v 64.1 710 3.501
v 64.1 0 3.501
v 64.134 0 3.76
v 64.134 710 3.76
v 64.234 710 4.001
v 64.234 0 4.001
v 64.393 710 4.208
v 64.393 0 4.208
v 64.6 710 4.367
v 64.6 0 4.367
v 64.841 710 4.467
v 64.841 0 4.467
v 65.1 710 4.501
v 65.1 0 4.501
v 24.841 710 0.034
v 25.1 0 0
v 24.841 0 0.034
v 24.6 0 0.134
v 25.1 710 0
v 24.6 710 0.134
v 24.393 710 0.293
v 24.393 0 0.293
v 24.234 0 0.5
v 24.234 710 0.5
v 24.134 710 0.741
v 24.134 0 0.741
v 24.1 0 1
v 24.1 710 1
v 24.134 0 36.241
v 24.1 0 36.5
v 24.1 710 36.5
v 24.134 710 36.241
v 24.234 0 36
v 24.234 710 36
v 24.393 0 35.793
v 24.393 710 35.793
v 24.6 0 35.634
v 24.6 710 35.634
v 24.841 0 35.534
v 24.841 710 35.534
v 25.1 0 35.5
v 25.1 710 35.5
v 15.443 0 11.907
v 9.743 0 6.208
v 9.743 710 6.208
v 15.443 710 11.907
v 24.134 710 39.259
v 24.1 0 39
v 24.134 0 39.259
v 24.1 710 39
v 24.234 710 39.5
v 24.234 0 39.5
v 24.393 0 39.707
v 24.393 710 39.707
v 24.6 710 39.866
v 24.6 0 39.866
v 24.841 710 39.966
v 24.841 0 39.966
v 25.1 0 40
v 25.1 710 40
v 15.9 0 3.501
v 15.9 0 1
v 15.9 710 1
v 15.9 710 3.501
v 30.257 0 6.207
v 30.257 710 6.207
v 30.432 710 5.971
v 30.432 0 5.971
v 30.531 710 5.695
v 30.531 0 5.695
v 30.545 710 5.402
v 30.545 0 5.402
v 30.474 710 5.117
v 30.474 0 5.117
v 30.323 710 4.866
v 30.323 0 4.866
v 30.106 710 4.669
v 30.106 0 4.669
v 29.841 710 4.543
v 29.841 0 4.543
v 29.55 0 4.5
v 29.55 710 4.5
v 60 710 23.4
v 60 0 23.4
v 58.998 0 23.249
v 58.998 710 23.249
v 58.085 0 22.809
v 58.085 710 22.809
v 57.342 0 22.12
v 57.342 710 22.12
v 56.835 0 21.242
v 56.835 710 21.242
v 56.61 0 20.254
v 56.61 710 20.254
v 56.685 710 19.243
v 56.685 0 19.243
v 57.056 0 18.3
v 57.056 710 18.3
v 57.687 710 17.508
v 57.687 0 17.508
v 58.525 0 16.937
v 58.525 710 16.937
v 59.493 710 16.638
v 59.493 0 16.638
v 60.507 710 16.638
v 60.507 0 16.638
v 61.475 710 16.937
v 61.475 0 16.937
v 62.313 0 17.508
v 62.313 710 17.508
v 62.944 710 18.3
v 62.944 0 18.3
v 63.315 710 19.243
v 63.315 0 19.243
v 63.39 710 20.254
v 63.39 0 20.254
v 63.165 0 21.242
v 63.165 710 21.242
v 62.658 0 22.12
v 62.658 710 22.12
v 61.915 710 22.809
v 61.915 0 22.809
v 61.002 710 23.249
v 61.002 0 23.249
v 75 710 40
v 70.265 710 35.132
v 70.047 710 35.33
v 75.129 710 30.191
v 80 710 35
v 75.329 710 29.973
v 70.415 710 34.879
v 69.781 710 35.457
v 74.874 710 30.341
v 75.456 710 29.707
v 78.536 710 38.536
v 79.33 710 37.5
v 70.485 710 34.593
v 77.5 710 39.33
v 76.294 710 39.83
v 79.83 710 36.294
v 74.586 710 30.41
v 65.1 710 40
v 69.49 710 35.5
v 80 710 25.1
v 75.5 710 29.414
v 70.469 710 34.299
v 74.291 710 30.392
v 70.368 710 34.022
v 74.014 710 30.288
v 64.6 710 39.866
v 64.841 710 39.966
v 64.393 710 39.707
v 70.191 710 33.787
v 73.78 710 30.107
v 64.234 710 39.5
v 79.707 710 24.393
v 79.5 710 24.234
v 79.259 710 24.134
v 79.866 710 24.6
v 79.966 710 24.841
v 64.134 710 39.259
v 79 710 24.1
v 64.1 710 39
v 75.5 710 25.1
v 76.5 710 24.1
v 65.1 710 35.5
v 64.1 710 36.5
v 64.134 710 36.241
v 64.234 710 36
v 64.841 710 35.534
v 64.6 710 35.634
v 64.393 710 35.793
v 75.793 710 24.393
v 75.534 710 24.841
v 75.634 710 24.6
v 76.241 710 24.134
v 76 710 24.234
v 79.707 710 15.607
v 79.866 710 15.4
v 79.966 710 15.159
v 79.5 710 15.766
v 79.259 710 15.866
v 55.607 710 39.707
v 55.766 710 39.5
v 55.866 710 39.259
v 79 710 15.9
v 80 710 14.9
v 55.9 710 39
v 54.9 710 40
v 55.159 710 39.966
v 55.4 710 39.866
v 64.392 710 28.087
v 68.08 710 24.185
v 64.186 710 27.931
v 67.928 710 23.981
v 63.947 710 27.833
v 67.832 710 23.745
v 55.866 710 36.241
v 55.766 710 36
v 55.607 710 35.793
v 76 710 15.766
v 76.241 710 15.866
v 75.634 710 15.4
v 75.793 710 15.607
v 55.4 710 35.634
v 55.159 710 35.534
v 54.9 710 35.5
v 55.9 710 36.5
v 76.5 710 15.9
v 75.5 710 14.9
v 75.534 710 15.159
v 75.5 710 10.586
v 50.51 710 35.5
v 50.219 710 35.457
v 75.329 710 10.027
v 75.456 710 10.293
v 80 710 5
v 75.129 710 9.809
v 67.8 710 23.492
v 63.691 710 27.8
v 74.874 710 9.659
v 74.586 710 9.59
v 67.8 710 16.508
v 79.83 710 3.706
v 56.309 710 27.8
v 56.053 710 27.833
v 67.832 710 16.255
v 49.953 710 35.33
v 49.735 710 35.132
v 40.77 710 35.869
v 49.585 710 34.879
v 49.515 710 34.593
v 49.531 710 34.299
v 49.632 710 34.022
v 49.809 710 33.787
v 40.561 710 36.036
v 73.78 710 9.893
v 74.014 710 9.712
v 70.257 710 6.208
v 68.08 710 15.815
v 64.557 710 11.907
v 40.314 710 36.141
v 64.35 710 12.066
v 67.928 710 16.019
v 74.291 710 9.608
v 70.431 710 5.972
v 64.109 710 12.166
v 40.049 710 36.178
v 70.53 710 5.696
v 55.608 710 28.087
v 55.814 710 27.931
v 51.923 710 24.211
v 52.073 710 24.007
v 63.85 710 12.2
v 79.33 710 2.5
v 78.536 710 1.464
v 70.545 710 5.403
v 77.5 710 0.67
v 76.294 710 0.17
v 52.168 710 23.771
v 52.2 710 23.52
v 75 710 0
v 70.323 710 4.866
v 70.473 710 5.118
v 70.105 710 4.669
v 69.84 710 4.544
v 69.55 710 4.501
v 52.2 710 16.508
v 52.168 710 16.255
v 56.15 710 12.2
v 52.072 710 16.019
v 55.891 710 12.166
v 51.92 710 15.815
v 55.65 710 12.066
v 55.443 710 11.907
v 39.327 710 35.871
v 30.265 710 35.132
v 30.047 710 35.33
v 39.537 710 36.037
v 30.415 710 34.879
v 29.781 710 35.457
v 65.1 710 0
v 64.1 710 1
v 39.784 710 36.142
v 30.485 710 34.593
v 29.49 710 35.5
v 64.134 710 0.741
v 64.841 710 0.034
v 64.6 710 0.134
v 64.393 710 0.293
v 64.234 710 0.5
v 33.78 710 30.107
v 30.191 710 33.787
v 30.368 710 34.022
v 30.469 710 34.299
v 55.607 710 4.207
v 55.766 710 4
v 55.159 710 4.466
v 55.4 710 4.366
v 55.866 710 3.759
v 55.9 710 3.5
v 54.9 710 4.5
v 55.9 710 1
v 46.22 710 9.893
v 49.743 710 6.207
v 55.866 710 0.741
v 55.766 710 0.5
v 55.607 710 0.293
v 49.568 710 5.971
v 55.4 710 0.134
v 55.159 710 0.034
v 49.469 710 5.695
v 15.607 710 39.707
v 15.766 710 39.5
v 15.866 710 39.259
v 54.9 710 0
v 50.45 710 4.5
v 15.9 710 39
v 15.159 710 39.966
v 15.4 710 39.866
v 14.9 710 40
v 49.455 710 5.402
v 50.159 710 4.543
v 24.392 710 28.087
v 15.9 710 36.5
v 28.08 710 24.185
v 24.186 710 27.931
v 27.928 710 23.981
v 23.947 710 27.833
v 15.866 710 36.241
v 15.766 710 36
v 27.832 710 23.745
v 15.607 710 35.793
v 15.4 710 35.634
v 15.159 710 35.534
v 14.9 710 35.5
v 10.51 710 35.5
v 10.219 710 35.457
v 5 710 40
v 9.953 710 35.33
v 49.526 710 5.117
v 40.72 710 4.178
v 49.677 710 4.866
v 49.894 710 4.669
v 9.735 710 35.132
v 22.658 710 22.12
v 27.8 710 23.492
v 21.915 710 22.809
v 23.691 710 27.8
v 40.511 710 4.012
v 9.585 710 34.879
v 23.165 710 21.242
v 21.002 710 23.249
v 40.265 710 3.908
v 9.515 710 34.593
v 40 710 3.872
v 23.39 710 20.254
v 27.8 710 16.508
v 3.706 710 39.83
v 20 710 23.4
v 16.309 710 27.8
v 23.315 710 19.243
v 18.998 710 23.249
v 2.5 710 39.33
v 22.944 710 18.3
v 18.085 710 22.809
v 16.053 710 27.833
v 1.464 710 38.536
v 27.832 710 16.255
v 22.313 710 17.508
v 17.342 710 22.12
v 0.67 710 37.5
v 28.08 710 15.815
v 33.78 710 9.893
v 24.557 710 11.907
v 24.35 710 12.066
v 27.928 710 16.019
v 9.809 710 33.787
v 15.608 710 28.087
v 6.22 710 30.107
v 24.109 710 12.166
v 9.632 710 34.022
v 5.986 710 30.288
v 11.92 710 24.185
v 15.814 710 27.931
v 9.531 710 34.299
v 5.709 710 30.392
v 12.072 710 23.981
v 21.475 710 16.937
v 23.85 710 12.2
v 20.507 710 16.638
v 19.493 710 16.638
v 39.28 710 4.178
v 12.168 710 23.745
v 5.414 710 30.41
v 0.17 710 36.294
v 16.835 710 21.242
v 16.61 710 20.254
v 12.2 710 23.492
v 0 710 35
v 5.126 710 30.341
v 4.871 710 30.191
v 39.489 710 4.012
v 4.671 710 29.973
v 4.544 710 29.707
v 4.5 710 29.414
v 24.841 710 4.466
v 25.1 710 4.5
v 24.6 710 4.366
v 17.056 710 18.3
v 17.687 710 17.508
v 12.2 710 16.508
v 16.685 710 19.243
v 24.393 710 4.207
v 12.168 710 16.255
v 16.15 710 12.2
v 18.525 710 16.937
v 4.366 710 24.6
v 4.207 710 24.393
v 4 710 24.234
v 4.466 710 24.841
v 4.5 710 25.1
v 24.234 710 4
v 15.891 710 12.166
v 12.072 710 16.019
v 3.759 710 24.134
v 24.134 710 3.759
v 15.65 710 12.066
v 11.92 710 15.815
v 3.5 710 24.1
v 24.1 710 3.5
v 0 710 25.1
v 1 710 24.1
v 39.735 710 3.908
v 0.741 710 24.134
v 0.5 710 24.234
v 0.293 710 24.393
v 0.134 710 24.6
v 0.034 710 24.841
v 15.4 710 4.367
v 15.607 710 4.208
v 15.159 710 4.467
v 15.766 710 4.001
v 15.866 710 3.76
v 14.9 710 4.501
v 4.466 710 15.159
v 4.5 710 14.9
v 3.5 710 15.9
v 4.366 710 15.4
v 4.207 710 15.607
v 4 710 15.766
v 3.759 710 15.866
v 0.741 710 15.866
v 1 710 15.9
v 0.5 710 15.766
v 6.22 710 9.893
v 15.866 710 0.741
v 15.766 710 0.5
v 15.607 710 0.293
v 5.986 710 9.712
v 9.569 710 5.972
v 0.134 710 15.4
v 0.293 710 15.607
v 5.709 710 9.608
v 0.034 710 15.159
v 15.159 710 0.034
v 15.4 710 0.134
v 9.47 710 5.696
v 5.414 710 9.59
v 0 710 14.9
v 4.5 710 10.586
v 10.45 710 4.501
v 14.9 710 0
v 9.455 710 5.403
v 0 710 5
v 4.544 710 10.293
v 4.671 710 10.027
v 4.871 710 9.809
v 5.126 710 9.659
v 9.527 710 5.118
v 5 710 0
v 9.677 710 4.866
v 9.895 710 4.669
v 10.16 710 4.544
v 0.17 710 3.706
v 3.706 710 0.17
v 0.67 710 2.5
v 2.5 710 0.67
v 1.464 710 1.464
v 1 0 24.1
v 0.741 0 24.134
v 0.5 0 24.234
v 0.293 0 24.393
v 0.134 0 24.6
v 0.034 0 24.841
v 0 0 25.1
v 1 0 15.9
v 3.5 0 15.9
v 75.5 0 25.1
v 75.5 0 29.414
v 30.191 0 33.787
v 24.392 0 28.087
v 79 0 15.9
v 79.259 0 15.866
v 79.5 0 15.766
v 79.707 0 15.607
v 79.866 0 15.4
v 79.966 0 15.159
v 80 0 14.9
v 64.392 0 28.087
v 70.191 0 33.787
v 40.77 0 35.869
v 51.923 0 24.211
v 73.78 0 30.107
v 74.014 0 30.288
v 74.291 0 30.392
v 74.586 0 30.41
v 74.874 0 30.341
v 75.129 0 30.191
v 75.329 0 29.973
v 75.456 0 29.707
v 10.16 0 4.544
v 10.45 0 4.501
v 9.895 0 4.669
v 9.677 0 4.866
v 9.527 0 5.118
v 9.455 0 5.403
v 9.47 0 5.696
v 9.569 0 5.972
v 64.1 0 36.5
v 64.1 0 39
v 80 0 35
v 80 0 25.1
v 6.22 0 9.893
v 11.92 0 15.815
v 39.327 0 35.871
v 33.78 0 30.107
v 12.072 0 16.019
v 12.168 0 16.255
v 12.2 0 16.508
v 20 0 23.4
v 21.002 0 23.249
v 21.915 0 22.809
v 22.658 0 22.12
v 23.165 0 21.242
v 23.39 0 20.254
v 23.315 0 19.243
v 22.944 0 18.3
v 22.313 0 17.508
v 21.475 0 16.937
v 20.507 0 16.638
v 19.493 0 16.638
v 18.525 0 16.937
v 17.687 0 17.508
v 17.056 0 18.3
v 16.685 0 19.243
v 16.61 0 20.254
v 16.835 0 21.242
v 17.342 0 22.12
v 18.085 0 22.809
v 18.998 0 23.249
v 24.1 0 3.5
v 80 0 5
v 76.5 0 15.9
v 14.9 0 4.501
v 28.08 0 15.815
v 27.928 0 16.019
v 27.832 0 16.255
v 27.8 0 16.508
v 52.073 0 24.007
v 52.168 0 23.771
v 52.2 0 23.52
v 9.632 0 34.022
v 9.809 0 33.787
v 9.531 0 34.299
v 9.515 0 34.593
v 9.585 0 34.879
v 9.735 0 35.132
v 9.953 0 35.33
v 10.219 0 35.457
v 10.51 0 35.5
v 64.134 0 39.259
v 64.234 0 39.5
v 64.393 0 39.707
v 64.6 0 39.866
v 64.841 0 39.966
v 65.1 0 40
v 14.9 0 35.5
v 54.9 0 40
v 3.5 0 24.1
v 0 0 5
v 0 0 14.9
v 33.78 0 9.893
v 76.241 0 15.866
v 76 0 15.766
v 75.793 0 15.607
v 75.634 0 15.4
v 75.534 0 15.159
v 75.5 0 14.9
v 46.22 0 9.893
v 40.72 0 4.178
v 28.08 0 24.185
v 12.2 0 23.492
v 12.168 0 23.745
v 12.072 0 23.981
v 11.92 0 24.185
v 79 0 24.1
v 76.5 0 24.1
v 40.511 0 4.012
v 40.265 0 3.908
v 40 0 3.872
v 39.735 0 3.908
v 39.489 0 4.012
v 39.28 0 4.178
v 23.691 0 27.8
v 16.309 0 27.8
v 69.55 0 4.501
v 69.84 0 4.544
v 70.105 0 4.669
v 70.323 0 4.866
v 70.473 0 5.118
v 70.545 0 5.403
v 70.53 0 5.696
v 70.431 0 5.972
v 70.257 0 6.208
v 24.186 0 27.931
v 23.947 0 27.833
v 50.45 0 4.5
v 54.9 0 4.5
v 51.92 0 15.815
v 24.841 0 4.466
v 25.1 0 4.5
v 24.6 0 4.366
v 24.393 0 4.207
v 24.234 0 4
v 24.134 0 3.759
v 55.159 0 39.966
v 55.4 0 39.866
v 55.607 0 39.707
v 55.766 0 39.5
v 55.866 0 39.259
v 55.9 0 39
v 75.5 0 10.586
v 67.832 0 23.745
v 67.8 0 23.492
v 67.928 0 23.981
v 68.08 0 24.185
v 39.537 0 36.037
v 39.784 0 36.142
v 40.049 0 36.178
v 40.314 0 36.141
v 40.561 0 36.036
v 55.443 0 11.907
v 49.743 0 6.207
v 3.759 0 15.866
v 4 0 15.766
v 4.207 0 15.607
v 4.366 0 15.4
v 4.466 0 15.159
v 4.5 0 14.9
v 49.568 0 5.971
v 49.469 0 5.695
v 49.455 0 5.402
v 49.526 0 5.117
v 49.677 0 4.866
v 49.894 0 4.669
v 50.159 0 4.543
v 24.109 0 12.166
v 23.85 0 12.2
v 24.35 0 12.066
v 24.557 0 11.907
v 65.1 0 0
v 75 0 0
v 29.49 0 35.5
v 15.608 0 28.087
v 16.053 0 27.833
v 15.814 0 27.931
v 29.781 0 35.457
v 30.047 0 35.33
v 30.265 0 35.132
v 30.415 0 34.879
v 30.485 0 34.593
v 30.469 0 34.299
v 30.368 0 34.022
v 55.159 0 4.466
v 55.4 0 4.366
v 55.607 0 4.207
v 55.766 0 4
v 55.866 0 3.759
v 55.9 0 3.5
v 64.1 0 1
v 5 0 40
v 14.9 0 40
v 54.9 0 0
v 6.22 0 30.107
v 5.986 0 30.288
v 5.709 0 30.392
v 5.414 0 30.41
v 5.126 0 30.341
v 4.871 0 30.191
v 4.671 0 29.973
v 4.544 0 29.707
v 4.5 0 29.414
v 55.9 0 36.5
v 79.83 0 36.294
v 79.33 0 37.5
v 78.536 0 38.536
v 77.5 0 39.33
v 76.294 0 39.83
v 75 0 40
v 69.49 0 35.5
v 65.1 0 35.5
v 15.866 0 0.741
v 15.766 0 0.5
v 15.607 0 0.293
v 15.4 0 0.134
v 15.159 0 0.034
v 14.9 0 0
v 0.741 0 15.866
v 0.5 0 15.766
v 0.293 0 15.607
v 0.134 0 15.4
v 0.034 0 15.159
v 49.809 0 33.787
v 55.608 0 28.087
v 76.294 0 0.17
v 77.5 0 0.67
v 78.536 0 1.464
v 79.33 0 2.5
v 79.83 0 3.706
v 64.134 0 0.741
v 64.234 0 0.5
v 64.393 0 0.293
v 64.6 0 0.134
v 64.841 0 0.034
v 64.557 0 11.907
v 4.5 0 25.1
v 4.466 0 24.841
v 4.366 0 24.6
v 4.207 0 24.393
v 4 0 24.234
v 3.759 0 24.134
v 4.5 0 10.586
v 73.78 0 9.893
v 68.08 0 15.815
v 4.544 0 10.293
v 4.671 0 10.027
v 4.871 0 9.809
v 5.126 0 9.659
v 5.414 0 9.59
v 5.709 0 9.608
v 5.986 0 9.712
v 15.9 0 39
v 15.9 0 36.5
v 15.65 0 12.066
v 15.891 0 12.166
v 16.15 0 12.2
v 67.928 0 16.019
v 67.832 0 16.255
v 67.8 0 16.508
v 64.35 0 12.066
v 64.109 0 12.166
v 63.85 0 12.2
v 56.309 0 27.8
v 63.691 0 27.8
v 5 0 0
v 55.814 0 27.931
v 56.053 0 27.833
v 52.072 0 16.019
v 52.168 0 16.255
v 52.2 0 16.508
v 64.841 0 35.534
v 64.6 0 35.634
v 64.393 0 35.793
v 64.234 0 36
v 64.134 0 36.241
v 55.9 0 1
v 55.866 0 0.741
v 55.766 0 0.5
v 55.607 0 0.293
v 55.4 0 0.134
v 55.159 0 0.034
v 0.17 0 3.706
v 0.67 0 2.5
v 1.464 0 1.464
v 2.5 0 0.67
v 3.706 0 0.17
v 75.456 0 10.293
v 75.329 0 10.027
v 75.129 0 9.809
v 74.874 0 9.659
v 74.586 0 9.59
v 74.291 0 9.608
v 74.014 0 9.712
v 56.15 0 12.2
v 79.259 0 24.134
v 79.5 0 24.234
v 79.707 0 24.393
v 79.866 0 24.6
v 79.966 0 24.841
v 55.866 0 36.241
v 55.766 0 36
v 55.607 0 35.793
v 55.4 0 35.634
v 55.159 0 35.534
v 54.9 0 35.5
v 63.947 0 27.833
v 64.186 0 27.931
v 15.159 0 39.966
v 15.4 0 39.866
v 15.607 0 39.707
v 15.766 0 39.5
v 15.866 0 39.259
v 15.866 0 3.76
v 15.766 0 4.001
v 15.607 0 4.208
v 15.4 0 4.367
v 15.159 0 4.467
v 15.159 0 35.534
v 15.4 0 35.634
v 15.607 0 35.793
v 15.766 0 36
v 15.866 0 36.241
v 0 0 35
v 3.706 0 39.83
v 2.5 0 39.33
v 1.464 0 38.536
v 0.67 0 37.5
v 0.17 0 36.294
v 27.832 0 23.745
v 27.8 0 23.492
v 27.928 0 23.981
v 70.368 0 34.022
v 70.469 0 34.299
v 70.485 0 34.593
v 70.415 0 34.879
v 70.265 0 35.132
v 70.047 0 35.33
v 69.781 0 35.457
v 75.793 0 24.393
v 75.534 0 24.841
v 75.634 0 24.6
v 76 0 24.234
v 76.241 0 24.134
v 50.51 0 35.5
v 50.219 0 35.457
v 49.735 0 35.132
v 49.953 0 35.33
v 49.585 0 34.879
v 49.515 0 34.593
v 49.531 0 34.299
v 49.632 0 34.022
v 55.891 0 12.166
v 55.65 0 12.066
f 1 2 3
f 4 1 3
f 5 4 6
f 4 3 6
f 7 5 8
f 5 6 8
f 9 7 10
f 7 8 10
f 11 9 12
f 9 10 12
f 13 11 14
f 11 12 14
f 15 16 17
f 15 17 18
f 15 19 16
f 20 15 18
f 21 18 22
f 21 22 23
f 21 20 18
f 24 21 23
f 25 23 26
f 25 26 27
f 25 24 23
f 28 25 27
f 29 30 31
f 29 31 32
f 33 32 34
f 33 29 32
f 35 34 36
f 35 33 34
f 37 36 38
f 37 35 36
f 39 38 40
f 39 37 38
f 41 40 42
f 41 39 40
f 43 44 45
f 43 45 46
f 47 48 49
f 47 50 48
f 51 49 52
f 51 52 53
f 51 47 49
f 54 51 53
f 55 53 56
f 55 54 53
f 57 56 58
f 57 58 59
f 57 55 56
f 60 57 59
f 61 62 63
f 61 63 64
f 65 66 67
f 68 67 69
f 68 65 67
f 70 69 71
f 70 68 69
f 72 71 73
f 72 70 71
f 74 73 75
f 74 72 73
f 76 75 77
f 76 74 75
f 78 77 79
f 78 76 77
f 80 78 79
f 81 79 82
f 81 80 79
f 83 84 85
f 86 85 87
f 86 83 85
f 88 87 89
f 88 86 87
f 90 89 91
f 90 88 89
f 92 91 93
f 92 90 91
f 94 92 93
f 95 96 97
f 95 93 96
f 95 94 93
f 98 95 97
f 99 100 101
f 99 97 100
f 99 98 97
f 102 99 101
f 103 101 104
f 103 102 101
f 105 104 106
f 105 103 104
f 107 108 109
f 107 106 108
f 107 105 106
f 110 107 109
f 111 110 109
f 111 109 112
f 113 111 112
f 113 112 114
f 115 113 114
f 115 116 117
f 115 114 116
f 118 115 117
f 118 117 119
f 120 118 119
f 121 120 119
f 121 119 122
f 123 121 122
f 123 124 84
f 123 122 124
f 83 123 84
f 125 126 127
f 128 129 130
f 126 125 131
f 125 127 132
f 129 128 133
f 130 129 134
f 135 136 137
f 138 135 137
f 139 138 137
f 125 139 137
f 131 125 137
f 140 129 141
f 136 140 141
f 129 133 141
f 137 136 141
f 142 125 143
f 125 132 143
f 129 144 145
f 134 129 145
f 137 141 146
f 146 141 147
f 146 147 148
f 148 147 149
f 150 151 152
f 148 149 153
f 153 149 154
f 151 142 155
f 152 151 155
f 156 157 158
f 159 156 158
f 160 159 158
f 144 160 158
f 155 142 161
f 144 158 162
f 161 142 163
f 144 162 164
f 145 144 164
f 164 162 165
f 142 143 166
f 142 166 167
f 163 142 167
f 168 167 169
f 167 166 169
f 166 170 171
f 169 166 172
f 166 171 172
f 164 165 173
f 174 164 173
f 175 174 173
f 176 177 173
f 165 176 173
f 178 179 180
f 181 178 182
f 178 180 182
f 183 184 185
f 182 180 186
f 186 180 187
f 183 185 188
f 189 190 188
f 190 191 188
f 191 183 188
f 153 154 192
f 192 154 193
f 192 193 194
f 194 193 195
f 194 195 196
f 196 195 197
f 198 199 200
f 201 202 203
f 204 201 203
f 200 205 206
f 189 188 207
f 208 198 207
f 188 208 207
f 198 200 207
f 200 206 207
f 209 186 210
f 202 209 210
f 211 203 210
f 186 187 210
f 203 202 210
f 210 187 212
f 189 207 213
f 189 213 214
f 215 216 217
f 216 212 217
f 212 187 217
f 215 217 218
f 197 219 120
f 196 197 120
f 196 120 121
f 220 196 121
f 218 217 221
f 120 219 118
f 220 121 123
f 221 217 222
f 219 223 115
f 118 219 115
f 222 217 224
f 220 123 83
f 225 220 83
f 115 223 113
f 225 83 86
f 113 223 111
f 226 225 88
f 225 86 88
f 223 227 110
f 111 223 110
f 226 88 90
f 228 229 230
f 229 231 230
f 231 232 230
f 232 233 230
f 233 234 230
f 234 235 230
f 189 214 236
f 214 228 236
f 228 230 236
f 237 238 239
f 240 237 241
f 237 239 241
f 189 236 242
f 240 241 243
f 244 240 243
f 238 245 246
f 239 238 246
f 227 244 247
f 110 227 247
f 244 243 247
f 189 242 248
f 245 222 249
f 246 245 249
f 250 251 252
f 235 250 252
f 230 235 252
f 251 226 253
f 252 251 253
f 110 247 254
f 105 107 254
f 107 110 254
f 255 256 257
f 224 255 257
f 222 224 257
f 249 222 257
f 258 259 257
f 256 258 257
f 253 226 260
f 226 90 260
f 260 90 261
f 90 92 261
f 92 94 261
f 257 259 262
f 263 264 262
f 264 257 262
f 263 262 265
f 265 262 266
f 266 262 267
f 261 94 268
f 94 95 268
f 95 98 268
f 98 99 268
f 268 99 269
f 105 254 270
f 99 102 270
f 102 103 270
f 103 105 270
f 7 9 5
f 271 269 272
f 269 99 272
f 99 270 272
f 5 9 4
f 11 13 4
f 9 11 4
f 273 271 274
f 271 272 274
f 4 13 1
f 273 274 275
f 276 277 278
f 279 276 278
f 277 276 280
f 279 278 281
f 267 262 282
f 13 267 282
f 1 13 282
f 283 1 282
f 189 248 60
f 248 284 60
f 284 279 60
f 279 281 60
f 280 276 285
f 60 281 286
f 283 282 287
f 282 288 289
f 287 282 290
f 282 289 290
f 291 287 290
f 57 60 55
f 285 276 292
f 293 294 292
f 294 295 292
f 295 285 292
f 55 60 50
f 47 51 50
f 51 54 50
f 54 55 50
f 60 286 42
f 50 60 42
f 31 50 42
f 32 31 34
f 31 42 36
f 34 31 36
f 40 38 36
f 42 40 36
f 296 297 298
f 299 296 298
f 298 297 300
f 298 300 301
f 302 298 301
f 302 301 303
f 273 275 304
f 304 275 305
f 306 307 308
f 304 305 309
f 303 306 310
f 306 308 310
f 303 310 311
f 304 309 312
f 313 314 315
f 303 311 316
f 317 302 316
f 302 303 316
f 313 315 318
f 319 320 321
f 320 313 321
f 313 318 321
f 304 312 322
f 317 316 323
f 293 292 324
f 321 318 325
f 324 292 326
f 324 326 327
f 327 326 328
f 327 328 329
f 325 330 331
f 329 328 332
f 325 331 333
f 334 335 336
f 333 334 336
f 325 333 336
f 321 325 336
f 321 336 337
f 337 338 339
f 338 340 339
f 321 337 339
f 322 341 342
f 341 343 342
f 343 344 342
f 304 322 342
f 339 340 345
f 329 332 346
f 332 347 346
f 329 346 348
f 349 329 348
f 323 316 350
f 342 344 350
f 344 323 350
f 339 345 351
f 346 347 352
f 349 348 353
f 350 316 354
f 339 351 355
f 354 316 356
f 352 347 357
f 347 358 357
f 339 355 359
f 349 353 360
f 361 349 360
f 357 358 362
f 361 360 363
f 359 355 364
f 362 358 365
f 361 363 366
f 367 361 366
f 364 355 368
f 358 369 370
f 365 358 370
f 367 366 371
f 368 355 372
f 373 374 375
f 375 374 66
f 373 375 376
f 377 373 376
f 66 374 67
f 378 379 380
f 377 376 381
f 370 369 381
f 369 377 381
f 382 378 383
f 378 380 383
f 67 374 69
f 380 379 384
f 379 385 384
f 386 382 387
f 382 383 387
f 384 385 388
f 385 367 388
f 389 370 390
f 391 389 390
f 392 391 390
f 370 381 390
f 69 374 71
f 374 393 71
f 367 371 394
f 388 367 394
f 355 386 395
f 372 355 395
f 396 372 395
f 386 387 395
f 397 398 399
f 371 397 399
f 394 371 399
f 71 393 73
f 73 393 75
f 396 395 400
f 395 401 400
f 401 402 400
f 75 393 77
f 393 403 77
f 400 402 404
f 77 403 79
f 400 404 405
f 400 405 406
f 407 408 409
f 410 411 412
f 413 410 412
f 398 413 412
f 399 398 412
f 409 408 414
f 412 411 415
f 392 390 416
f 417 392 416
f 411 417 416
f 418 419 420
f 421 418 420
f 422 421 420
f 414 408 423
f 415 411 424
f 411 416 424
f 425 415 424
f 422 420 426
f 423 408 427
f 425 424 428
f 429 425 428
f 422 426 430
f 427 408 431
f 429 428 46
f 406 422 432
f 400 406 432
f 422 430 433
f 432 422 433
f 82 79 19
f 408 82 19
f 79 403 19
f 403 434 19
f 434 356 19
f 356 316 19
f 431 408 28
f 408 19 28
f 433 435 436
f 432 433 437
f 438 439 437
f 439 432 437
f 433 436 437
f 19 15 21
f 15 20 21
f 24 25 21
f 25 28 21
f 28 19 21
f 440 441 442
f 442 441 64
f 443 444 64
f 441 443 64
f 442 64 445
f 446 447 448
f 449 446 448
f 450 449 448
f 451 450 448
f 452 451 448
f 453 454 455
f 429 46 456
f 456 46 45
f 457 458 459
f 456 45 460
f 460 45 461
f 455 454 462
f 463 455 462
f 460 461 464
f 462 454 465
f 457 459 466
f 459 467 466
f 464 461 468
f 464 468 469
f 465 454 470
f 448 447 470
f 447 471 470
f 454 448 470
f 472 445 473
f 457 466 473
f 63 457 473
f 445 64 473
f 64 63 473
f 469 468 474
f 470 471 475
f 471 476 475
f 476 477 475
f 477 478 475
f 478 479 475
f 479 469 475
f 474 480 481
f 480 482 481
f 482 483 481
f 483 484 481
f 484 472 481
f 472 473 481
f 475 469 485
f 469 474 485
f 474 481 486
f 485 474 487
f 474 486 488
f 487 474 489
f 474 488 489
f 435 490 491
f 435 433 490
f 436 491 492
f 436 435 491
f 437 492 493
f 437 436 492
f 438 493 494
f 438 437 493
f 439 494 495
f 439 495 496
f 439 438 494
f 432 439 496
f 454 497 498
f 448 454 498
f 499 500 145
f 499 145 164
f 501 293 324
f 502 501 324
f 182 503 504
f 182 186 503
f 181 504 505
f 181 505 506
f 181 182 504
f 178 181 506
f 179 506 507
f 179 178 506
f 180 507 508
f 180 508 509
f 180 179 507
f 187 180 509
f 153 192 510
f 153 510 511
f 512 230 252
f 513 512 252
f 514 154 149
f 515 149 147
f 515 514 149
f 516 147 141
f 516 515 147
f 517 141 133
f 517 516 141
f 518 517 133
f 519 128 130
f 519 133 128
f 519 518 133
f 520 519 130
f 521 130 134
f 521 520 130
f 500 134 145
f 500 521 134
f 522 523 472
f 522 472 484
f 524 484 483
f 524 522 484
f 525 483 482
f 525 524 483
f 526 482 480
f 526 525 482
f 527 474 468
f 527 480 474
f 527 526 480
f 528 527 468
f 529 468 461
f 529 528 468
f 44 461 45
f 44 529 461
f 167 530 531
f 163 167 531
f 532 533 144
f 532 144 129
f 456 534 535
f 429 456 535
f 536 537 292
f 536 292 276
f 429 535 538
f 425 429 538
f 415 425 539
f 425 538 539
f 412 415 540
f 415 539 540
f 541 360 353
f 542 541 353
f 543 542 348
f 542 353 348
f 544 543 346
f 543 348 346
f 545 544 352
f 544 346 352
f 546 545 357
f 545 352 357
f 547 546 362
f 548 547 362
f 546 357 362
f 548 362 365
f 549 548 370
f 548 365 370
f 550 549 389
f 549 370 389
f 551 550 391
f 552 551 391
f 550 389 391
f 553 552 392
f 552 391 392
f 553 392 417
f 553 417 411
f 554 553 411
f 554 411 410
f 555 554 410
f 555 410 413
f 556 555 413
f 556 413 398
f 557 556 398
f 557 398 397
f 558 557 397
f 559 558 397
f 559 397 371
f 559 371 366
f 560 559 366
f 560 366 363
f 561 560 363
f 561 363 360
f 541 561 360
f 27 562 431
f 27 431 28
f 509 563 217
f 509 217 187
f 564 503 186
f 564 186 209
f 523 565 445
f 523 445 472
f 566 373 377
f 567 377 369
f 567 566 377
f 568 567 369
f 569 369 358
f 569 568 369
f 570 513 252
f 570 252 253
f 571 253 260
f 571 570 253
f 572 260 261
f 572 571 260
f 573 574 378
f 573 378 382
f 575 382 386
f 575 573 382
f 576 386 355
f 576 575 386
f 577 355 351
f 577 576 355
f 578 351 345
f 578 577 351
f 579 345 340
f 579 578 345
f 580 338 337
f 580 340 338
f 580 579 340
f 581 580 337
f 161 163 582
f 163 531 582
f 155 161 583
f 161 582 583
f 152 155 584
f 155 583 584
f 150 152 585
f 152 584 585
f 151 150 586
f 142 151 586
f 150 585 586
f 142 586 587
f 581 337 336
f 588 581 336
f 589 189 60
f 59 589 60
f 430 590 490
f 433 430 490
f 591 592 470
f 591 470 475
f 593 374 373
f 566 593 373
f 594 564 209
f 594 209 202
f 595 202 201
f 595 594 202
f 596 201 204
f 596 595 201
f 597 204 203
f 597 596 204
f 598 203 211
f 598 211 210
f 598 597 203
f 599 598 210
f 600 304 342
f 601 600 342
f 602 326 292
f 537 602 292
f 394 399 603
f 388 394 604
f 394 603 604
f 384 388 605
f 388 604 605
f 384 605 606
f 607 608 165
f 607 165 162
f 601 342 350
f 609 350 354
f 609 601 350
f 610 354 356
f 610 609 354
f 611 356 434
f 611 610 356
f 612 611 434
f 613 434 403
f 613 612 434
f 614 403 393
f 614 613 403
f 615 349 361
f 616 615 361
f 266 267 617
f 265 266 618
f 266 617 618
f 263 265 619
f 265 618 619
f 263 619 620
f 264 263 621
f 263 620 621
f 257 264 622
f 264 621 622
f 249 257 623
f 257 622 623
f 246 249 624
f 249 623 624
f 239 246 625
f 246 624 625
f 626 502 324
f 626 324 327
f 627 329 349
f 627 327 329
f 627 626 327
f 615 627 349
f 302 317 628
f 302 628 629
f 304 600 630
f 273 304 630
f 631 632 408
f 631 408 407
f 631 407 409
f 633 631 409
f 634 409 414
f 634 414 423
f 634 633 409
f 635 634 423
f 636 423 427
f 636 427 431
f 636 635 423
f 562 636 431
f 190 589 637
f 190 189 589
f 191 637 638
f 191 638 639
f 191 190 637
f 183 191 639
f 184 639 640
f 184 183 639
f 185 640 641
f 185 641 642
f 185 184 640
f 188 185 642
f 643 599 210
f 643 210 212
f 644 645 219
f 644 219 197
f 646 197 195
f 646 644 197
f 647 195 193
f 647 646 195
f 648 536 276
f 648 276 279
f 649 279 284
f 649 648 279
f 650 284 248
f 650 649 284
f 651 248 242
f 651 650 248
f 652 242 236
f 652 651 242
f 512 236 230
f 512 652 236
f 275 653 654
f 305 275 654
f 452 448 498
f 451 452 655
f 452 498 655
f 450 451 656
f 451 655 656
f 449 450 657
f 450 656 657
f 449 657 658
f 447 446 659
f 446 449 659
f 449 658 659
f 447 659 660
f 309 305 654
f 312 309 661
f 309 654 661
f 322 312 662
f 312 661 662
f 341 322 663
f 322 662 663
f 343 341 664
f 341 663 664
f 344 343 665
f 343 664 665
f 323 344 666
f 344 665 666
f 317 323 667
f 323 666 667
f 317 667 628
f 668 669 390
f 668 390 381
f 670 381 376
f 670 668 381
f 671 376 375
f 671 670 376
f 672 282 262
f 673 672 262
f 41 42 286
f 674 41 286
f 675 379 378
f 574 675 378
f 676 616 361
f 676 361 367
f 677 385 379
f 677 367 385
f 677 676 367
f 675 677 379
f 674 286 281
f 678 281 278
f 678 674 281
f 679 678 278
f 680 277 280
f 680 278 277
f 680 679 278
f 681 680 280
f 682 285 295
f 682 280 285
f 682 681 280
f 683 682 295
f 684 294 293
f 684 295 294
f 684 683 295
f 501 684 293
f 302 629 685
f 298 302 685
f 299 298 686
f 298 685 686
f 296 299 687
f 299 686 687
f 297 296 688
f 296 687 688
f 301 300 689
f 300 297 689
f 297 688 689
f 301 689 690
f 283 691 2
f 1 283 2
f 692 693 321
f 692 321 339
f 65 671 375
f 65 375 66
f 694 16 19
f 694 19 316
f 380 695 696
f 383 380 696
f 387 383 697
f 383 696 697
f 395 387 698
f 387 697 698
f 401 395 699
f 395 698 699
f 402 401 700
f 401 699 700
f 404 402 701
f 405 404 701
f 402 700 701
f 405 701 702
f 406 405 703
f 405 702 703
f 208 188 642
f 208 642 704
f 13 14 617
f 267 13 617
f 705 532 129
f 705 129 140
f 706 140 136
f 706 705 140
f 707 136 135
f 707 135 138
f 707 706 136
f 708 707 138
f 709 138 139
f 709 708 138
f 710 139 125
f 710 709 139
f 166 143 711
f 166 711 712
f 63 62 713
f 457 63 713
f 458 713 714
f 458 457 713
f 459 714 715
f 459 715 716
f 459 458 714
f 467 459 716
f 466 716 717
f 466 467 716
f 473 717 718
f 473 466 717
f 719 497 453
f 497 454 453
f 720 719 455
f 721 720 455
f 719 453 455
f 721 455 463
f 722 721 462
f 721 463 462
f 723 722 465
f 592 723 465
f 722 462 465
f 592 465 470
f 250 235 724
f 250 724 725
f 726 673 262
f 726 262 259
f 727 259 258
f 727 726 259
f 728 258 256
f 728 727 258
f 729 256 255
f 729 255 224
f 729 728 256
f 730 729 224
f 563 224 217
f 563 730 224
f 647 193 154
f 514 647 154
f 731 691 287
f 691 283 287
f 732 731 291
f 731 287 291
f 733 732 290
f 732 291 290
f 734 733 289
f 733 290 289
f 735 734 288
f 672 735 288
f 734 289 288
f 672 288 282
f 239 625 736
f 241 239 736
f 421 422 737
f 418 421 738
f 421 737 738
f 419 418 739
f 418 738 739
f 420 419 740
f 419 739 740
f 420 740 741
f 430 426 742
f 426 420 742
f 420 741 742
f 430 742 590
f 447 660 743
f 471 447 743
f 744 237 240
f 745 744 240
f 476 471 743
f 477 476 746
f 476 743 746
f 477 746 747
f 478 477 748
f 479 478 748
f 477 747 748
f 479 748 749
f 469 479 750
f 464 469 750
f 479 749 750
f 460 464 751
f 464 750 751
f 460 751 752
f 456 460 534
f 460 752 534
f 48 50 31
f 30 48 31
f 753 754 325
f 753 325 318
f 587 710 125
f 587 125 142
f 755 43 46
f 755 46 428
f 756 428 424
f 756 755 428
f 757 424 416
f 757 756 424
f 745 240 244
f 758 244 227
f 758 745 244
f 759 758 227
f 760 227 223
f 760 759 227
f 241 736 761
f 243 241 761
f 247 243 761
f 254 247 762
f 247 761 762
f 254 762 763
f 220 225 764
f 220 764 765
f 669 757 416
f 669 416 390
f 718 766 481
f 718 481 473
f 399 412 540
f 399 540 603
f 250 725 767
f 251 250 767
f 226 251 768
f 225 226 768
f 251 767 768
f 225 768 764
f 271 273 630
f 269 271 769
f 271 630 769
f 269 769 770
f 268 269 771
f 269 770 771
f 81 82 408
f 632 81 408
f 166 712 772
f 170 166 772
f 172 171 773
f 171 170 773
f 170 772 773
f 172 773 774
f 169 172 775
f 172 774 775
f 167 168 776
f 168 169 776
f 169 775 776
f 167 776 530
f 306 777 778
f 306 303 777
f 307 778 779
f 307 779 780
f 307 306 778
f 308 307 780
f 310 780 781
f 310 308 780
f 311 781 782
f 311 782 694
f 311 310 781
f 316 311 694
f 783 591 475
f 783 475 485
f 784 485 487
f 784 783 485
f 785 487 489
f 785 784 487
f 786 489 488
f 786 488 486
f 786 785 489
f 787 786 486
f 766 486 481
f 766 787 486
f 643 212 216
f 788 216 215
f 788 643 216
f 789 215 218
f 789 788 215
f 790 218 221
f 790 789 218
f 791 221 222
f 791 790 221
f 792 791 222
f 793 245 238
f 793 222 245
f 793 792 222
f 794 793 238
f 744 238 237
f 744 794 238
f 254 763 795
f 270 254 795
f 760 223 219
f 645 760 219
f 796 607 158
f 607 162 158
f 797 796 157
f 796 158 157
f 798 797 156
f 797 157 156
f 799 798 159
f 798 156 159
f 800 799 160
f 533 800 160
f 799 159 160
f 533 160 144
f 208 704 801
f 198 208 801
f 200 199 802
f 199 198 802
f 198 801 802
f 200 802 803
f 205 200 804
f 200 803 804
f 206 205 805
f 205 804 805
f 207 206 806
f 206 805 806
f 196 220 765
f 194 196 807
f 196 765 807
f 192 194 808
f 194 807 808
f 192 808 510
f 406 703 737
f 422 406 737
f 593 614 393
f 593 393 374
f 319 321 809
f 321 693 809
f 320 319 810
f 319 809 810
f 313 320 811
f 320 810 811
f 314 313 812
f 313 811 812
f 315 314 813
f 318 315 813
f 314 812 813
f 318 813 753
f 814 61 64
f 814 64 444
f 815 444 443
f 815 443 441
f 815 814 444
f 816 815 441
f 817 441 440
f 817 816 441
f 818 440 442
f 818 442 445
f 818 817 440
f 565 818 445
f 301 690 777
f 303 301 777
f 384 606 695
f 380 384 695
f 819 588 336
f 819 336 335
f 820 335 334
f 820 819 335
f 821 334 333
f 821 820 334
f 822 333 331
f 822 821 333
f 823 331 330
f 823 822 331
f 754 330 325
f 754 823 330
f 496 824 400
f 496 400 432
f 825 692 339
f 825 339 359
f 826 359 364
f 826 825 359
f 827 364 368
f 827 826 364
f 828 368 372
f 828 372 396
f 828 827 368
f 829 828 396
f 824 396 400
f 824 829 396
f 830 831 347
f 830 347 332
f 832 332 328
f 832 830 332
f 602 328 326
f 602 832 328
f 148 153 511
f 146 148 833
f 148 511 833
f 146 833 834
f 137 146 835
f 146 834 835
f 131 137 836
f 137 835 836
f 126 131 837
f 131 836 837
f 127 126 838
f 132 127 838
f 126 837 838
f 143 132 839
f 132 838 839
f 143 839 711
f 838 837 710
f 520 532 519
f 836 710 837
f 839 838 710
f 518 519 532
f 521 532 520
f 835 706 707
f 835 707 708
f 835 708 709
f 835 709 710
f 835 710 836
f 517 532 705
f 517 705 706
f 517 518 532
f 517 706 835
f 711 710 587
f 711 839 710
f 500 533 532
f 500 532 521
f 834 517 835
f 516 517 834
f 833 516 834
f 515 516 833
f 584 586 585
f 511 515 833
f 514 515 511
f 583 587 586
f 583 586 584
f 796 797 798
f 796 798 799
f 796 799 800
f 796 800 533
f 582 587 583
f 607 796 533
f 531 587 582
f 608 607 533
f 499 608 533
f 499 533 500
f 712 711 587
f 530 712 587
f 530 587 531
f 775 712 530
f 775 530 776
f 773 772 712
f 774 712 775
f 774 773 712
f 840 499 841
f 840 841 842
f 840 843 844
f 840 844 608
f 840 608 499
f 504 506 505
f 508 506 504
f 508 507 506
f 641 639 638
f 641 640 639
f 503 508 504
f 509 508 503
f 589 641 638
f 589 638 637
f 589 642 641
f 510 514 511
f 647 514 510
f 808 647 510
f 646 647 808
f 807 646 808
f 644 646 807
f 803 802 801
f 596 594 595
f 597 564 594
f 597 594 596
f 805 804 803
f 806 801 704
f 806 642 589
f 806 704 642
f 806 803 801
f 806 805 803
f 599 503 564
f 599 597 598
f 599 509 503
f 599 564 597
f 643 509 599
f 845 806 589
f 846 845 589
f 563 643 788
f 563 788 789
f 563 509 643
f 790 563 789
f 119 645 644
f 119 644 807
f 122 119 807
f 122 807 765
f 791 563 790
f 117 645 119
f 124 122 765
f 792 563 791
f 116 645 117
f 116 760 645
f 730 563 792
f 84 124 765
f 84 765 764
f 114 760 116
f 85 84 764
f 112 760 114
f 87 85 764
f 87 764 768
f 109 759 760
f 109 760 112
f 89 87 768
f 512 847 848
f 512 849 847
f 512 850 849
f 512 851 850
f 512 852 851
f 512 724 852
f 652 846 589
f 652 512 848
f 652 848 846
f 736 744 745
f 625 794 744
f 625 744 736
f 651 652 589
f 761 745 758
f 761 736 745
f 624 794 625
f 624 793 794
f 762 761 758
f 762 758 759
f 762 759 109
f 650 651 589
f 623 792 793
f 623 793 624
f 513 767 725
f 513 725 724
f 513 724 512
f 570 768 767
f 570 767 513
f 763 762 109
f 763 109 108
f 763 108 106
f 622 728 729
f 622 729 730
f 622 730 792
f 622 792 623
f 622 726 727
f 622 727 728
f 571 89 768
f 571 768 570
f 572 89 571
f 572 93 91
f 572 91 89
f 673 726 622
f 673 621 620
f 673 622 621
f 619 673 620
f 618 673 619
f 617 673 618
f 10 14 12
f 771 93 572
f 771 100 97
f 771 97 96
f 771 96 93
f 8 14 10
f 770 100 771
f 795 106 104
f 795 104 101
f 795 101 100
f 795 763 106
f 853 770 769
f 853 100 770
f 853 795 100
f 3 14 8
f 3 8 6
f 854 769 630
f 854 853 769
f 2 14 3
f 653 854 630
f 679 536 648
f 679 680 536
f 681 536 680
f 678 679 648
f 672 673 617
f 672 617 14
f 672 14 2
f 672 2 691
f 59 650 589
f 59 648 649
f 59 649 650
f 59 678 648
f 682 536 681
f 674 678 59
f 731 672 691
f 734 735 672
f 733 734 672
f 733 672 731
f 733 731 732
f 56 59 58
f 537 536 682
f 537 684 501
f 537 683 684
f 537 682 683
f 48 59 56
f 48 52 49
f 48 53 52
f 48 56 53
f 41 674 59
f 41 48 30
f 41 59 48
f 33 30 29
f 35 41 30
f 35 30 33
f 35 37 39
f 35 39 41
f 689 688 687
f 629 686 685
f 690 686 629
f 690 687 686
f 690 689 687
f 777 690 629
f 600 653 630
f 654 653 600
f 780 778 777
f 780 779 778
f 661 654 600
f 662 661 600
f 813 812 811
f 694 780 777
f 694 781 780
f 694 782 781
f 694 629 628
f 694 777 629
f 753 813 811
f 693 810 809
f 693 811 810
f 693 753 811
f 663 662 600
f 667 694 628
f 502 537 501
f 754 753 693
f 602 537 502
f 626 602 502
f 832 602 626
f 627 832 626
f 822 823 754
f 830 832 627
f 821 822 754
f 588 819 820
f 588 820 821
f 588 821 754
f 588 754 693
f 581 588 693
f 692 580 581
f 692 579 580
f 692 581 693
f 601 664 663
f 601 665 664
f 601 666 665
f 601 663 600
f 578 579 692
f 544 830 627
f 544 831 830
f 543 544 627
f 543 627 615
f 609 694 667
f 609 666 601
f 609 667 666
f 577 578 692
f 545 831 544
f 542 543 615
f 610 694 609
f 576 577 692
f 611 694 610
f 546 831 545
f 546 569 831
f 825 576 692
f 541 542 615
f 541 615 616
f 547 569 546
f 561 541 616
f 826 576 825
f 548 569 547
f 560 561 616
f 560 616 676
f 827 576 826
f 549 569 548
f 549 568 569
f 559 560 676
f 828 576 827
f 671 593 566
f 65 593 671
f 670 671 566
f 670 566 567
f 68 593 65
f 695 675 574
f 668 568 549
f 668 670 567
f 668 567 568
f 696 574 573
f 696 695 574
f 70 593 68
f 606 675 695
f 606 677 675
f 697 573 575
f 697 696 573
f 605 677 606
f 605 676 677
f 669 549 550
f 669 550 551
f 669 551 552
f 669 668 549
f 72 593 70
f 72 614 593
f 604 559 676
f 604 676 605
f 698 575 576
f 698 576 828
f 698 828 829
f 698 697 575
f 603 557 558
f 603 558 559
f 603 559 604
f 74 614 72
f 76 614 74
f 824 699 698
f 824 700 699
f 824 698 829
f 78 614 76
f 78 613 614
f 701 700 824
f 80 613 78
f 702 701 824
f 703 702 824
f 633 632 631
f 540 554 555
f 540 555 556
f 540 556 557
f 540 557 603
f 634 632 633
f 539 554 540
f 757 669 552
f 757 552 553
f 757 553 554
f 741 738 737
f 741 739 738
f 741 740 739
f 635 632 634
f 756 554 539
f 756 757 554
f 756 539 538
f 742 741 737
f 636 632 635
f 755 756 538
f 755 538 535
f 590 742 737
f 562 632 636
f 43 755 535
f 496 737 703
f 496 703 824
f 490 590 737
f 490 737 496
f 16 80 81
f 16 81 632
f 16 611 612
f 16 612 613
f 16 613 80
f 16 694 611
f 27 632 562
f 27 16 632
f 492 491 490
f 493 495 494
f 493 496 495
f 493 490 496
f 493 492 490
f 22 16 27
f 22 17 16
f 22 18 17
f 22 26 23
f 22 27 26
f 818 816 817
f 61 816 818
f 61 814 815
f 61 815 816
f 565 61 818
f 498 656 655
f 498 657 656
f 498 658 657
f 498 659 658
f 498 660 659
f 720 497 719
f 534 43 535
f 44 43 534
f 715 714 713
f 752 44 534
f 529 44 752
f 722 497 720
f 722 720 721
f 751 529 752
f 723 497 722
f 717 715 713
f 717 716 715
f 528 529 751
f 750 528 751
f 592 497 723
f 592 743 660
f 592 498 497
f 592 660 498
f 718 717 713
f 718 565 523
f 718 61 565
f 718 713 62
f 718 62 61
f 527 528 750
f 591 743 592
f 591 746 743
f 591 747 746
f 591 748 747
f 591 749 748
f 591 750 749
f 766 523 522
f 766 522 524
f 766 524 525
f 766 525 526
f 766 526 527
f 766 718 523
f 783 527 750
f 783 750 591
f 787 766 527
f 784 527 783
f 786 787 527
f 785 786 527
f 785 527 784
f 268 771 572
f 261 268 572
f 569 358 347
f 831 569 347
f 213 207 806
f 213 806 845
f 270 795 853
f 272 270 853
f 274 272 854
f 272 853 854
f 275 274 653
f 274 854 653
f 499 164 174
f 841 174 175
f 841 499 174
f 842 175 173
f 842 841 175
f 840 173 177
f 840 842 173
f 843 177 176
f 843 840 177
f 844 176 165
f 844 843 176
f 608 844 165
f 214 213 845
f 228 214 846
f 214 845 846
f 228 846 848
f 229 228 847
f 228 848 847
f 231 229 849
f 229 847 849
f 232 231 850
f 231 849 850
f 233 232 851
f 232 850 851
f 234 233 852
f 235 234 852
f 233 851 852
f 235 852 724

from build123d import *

# Parameters (mm, degrees)
BOSS_EXTRUDE1_DEPTH   = 710
SKETCH3_R             = 3.4
CUT_EXTRUDE1_DEPTH    = 716.611626513
CUT_EXTRUDE2_DEPTH    = 716.611626513
FILLET1_R             = 1
FILLET2_R             = 1
FILLET3_R             = 1
CUT_EXTRUDE3_DEPTH    = 716.611626513
CUT_EXTRUDE4_DEPTH    = 716.611626513
FILLET4_R             = 1
FILLET5_R             = 1
FILLET6_R             = 1
FILLET7_R             = 1
FILLET8_R             = 1
FILLET9_R             = 1
FILLET10_R            = 1
FILLET11_R            = 1
MIRROR11_COPY_1_DEPTH = 716.611626513
MIRROR11_COPY_2_DEPTH = 716.611626513
CUT_EXTRUDE5_DEPTH    = 1000


with BuildPart() as part:
    # Sketch1 → Boss-Extrude1 (new body)
    with BuildSketch(Plane(origin=(0, 0, 0), x_dir=(1, 0, 0), z_dir=(0, 1, 0))):
        with BuildLine():
            Line((5, 0), (75, 0))
            ThreePointArc((75, 0), (78.535533906, -1.464466094), (80, -5))
            Line((80, -5), (80, -35))
            ThreePointArc((80, -35), (78.535533906, -38.535533906), (75, -40))
            Line((75, -40), (5, -40))
            ThreePointArc((5, -40), (1.464466094, -38.535533906), (0, -35))
            Line((0, -35), (0, -5))
            ThreePointArc((0, -5), (1.464466094, -1.464466094), (5, 0))
        make_face()
    extrude(amount=BOSS_EXTRUDE1_DEPTH)

    # Sketch3 → Cut-Extrude1 (cut, through all)
    with BuildSketch(Plane(origin=(0, 710, 0), x_dir=(1, 0, 0), z_dir=(0, 1, 0))):
        with Locations(Location((20, -20, 0), (0, 0, 270))):
            Circle(SKETCH3_R)
    cut_extrude1 = extrude(amount=-CUT_EXTRUDE1_DEPTH, mode=Mode.SUBTRACT)

    # Mirror3: Cut-Extrude1 across plane
    add(cut_extrude1.mirror(Plane(origin=(40, 0, 0), x_dir=(0, 0, 1), z_dir=(1, 0, 0))), mode=Mode.SUBTRACT)

    # Sketch7 → Cut-Extrude2 (cut, symmetric)
    with BuildSketch(Plane(origin=(0, 0, 0), x_dir=(-1, 0, 0), z_dir=(0, -1, 0))):
        with BuildLine():
            Line((-15.9, -40), (-24.1, -40))
            Line((-24.1, -40), (-24.1, -36.5))
            ThreePointArc((-24.1, -36.5), (-24.392893219, -35.792893219), (-25.1, -35.5))
            Line((-25.1, -35.5), (-29.489753594, -35.5))
            ThreePointArc((-29.489753594, -35.5), (-30.415270825, -34.8787055), (-30.190750526, -33.786835712))
            Line((-30.190750526, -33.786835712), (-24.391814382, -28.086835712))
            ThreePointArc((-24.391814382, -28.086835712), (-24.069522951, -27.874482769), (-23.69081745, -27.8))
            Line((-23.69081745, -27.8), (-16.309186536, -27.8))
            ThreePointArc((-16.309186536, -27.8), (-15.930477876, -27.874484063), (-15.608184734, -28.086840499))
            Line((-15.608184734, -28.086840499), (-9.809327805, -33.786840499))
            ThreePointArc((-9.809327805, -33.786840499), (-9.584813669, -34.87870866), (-10.510329607, -35.5))
            Line((-10.510329607, -35.5), (-14.9, -35.5))
            ThreePointArc((-14.9, -35.5), (-15.607106781, -35.792893219), (-15.9, -36.5))
            Line((-15.9, -36.5), (-15.9, -40))
        make_face()
    cut_extrude2 = extrude(amount=CUT_EXTRUDE2_DEPTH, both=True, mode=Mode.SUBTRACT)

    # Fillet1
    fillet1_edges = [part.edges().sort_by_distance(p)[0] for p in [
        (15.9, 355, 40),
        (24.1, 355, 40),
    ]]
    fillet(fillet1_edges, radius=FILLET1_R)

    # Mirror8: Cut-Extrude2 across plane
    add(cut_extrude2.mirror(Plane(origin=(40, 0, 0), x_dir=(0, 0, 1), z_dir=(1, 0, 0))), mode=Mode.SUBTRACT)

    # Fillet2
    fillet2_edges = [part.edges().sort_by_distance(p)[0] for p in [
        (55.9, 355, 40),
    ]]
    fillet(fillet2_edges, radius=FILLET2_R)

    # Fillet3
    fillet3_edges = [part.edges().sort_by_distance(p)[0] for p in [
        (64.1, 355, 40),
    ]]
    fillet(fillet3_edges, radius=FILLET3_R)

    # Sketch9 → Cut-Extrude3 (cut, through all)
    with BuildSketch(Plane(origin=(0, 0, 0), x_dir=(1, 0, 0), z_dir=(0, 1, 0))):
        with BuildLine():
            Line((14.899846923, -4.500713815), (10.450461284, -4.500713815))
            ThreePointArc((10.450461284, -4.500713815), (9.526581751, -5.118030383), (9.743354502, -6.207820596))
            Line((9.743354502, -6.207820596), (15.442640687, -11.907106781))
            ThreePointArc((15.442640687, -11.907106781), (15.767064036, -12.123879533), (16.149747468, -12.2))
            Line((16.149747468, -12.2), (23.850252532, -12.2))
            ThreePointArc((23.850252532, -12.2), (24.232935964, -12.123879533), (24.557359313, -11.907106781))
            Line((24.557359313, -11.907106781), (30.257359313, -6.207106781))
            ThreePointArc((30.257359313, -6.207106781), (30.474132064, -5.117316568), (29.550252532, -4.5))
            Line((29.550252532, -4.5), (25.099846964, -4.5))
            ThreePointArc((25.099846964, -4.5), (24.392724723, -4.207091321), (24.099846965, -3.499956273))
            Line((24.099846965, -3.499956273), (24.100000008, 0))
            Line((24.100000008, 0), (15.9, 0))
            Line((15.9, 0), (15.899846922, -3.500757542))
            ThreePointArc((15.899846922, -3.500757542), (15.606938244, -4.207836056), (14.899846923, -4.500713815))
        make_face()
    cut_extrude3 = extrude(amount=CUT_EXTRUDE3_DEPTH, mode=Mode.SUBTRACT)

    # Mirror9: Cut-Extrude3 across plane
    add(cut_extrude3.mirror(Plane(origin=(40, 0, 0), x_dir=(0, 0, 1), z_dir=(1, 0, 0))), mode=Mode.SUBTRACT)

    # Sketch10 → Cut-Extrude4 (cut, through all)
    with BuildSketch(Plane(origin=(0, 0, 0), x_dir=(1, 0, 0), z_dir=(0, 1, 0))):
        with BuildLine():
            Line((4.5, -14.9), (4.5, -10.58605332))
            ThreePointArc((4.5, -10.58605332), (5.126159695, -9.658560233), (6.220486853, -9.892584724))
            Line((6.220486853, -9.892584724), (11.920486853, -15.814662646))
            ThreePointArc((11.920486853, -15.814662646), (12.127493087, -16.134290938), (12.2, -16.508131242))
            Line((12.2, -16.508131242), (12.2, -23.491868758))
            ThreePointArc((12.2, -23.491868758), (12.127493087, -23.865709062), (11.920486853, -24.185337354))
            Line((11.920486853, -24.185337354), (6.220486853, -30.107415276))
            ThreePointArc((6.220486853, -30.107415276), (5.126159695, -30.341439767), (4.5, -29.41394668))
            Line((4.5, -29.41394668), (4.5, -25.1))
            ThreePointArc((4.5, -25.1), (4.207106781, -24.392893219), (3.5, -24.1))
            Line((3.5, -24.1), (0, -24.1))
            Line((0, -24.1), (0, -15.9))
            Line((0, -15.9), (3.5, -15.9))
            ThreePointArc((3.5, -15.9), (4.207106781, -15.607106781), (4.5, -14.9))
        make_face()
    cut_extrude4 = extrude(amount=CUT_EXTRUDE4_DEPTH, mode=Mode.SUBTRACT)

    # Fillet4
    fillet4_edges = [part.edges().sort_by_distance(p)[0] for p in [
        (24.100000008, 355, 0),
    ]]
    fillet(fillet4_edges, radius=FILLET4_R)

    # Fillet5
    fillet5_edges = [part.edges().sort_by_distance(p)[0] for p in [
        (64.1, 355, 0),
    ]]
    fillet(fillet5_edges, radius=FILLET5_R)

    # Fillet6
    fillet6_edges = [part.edges().sort_by_distance(p)[0] for p in [
        (55.899999992, 355, 0),
    ]]
    fillet(fillet6_edges, radius=FILLET6_R)

    # Fillet7
    fillet7_edges = [part.edges().sort_by_distance(p)[0] for p in [
        (15.9, 355, 0),
    ]]
    fillet(fillet7_edges, radius=FILLET7_R)

    # Fillet8
    fillet8_edges = [part.edges().sort_by_distance(p)[0] for p in [
        (0, 355, 24.1),
    ]]
    fillet(fillet8_edges, radius=FILLET8_R)

    # Fillet9
    fillet9_edges = [part.edges().sort_by_distance(p)[0] for p in [
        (0, 355, 15.9),
    ]]
    fillet(fillet9_edges, radius=FILLET9_R)

    # Mirror10: Cut-Extrude4 across plane
    add(cut_extrude4.mirror(Plane(origin=(40, 0, 0), x_dir=(0, 0, 1), z_dir=(1, 0, 0))), mode=Mode.SUBTRACT)

    # Fillet10
    fillet10_edges = [part.edges().sort_by_distance(p)[0] for p in [
        (80, 355, 15.9),
    ]]
    fillet(fillet10_edges, radius=FILLET10_R)

    # Fillet11
    fillet11_edges = [part.edges().sort_by_distance(p)[0] for p in [
        (80, 355, 24.1),
    ]]
    fillet(fillet11_edges, radius=FILLET11_R)

    # Mirror11 copy 1 sketch → Mirror11 copy 1 (cut, through all)
    with BuildSketch(Plane(origin=(40, 0, 0), x_dir=(1, 0, 0), z_dir=(0, 1, 0))):
        with BuildLine():
            Line((4.5, -14.9), (4.5, -10.58605332))
            ThreePointArc((4.5, -10.58605332), (5.126159695, -9.658560233), (6.220486853, -9.892584724))
            Line((6.220486853, -9.892584724), (11.920486853, -15.814662646))
            ThreePointArc((11.920486853, -15.814662646), (12.127493087, -16.134290938), (12.2, -16.508131242))
            Line((12.2, -16.508131242), (12.2, -23.491868758))
            ThreePointArc((12.2, -23.491868758), (12.127493087, -23.865709062), (11.920486853, -24.185337354))
            Line((11.920486853, -24.185337354), (6.220486853, -30.107415276))
            ThreePointArc((6.220486853, -30.107415276), (5.126159695, -30.341439767), (4.5, -29.41394668))
            Line((4.5, -29.41394668), (4.5, -25.1))
            ThreePointArc((4.5, -25.1), (4.207106781, -24.392893219), (3.5, -24.1))
            Line((3.5, -24.1), (0, -24.1))
            Line((0, -24.1), (0, -15.9))
            Line((0, -15.9), (3.5, -15.9))
            ThreePointArc((3.5, -15.9), (4.207106781, -15.607106781), (4.5, -14.9))
        make_face()
    extrude(amount=MIRROR11_COPY_1_DEPTH, mode=Mode.SUBTRACT)

    # Mirror11 copy 2 sketch → Mirror11 copy 2 (cut, through all)
    with BuildSketch(Plane(origin=(120, 0, 0), x_dir=(-1, 0, 0), z_dir=(0, 1, 0))):
        with BuildLine():
            Line((4.5, 14.9), (4.5, 10.58605332))
            ThreePointArc((4.5, 10.58605332), (5.126159695, 9.658560233), (6.220486853, 9.892584724))
            Line((6.220486853, 9.892584724), (11.920486853, 15.814662646))
            ThreePointArc((11.920486853, 15.814662646), (12.127493087, 16.134290938), (12.2, 16.508131242))
            Line((12.2, 16.508131242), (12.2, 23.491868758))
            ThreePointArc((12.2, 23.491868758), (12.127493087, 23.865709062), (11.920486853, 24.185337354))
            Line((11.920486853, 24.185337354), (6.220486853, 30.107415276))
            ThreePointArc((6.220486853, 30.107415276), (5.126159695, 30.341439767), (4.5, 29.41394668))
            Line((4.5, 29.41394668), (4.5, 25.1))
            ThreePointArc((4.5, 25.1), (4.207106781, 24.392893219), (3.5, 24.1))
            Line((3.5, 24.1), (0, 24.1))
            Line((0, 24.1), (0, 15.9))
            Line((0, 15.9), (3.5, 15.9))
            ThreePointArc((3.5, 15.9), (4.207106781, 15.607106781), (4.5, 14.9))
        make_face()
    extrude(amount=MIRROR11_COPY_2_DEPTH, mode=Mode.SUBTRACT)

    # Mirror12: Cut-Extrude4 across plane
    add(cut_extrude4.mirror(Plane.ZY.offset(-20)), mode=Mode.SUBTRACT)

    # Sketch12 → Cut-Extrude5 (cut)
    with BuildSketch(Plane(origin=(0, 0, 0), x_dir=(-1, 0, 0), z_dir=(0, -1, 0))):
        with BuildLine():
            Line((-28.079513147, -24.185337354), (-39.327067998, -35.871108628))
            ThreePointArc((-39.327067998, -35.871108628), (-40.049082116, -36.177638866), (-40.770156561, -35.868904648))
            Line((-40.770156561, -35.868904648), (-51.922601709, -24.210885791))
            ThreePointArc((-51.922601709, -24.210885791), (-52.128062958, -23.892044517), (-52.2, -23.519621175))
            Line((-52.2, -23.519621175), (-52.2, -16.508131242))
            ThreePointArc((-52.2, -16.508131242), (-52.127493087, -16.134290938), (-51.920486853, -15.814662646))
            Line((-51.920486853, -15.814662646), (-40.720486853, -4.17829901))
            ThreePointArc((-40.720486853, -4.17829901), (-40, -3.871767606), (-39.279513147, -4.17829901))
            Line((-39.279513147, -4.17829901), (-28.079513147, -15.814662646))
            ThreePointArc((-28.079513147, -15.814662646), (-27.872506913, -16.134290938), (-27.8, -16.508131242))
            Line((-27.8, -16.508131242), (-27.8, -23.491868758))
            ThreePointArc((-27.8, -23.491868758), (-27.872506913, -23.865709062), (-28.079513147, -24.185337354))
        make_face()
    extrude(amount=-CUT_EXTRUDE5_DEPTH, mode=Mode.SUBTRACT)


solid = part.part
